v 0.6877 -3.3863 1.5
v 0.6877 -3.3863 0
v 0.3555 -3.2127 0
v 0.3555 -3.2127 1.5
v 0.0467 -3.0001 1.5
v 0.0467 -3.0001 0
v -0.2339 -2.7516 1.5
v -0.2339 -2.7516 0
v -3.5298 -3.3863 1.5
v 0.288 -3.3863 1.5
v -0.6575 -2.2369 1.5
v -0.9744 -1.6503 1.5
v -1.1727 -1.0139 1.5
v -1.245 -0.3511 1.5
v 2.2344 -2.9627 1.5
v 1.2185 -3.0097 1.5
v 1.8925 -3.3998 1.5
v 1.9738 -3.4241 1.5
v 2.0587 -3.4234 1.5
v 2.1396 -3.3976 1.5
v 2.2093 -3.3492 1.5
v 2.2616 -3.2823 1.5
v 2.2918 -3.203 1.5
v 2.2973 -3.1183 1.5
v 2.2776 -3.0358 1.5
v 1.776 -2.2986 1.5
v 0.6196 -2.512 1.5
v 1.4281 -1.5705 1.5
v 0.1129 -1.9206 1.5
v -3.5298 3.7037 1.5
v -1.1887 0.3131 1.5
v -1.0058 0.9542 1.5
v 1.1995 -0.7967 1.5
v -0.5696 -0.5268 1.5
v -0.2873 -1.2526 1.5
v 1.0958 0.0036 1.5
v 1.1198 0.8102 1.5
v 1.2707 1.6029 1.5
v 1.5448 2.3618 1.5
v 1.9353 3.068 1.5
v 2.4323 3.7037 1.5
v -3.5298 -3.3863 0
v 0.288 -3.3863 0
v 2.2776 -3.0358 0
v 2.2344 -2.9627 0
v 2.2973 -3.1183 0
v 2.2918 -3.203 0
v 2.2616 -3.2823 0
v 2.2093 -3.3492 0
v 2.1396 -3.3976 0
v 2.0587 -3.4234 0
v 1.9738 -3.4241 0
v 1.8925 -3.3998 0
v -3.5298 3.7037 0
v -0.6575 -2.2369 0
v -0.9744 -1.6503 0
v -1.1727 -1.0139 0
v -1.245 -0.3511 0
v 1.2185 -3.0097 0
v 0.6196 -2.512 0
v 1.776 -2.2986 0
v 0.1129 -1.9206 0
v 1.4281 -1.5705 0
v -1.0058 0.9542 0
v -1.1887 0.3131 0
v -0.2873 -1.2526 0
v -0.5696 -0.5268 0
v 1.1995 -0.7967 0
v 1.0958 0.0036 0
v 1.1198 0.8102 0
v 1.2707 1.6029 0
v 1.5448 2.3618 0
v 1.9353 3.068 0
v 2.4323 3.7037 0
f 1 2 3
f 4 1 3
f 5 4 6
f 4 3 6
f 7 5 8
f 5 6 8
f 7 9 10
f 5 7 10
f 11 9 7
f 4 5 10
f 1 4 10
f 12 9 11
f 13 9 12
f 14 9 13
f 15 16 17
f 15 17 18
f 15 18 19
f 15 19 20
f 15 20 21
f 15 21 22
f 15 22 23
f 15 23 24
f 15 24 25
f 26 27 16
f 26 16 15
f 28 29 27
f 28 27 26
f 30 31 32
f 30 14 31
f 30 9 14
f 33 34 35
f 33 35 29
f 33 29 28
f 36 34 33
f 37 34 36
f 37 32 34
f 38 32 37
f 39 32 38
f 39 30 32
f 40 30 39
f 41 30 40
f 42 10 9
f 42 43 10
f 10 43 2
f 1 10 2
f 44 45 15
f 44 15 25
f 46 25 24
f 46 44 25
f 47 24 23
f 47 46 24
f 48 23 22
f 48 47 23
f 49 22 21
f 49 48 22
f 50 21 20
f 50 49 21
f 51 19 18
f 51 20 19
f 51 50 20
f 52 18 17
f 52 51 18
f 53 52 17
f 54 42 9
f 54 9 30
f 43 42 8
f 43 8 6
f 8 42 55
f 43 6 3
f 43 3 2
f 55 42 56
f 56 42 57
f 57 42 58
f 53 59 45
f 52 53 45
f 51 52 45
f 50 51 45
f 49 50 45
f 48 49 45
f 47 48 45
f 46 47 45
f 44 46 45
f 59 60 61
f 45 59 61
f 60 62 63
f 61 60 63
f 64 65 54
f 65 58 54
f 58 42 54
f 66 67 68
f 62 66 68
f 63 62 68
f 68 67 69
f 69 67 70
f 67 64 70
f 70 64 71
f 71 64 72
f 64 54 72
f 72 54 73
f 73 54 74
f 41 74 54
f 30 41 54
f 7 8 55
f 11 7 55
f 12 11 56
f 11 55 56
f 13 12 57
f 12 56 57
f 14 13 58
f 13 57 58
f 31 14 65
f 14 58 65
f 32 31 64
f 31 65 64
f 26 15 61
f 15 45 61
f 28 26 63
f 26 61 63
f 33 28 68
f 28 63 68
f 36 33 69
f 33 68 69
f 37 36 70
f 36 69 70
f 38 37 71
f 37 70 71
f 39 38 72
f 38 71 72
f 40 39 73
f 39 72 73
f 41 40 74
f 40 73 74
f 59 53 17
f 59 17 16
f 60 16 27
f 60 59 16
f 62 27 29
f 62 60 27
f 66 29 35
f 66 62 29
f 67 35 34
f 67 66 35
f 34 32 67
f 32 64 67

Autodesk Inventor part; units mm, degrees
ref_plane "YZ Plane" through (0, 0, 0) normal (1, 0, 0) x (0, 1, 0)
ref_plane "XZ Plane" through (0, 0, 0) normal (0, 1, 0) x (-1, 0, 0)
ref_plane "XY Plane" through (0, 0, 0) normal (0, 0, 1) x (1, 0, 0)
sketch "Sketch1" plane through (0, 0, 0) normal (1, 0, 0) x (0, 1, 0)
  point P0 (0, 0)
sketch "Sketch2" plane through (0, 0, 0) normal (0, 0, 1) x (1, 0, 0)
  line L0 (4.0785, 4.9113) -> (2.4908, 4.9113) construction
  line L1 (4.0785, 3.7037) -> (4.0785, 4.9113) construction
  line L2 (2.4323, 3.7037) -> (4.0785, 3.7037) construction
  arc A0 (2.4323, 3.7037) -> (2.2344, -2.9627) centre (6.1869, 0.2561) ccw
  arc A1 (1.8925, -3.3998) -> (2.2344, -2.9627) centre (2.0138, -3.1424) ccw
  arc A2 (-0.5696, -0.5268) -> (1.8925, -3.3998) centre (3.8604, 0.7782) ccw
  line L3 (-1.0058, 0.9542) -> (-0.5696, -0.5268)
  arc A3 (-1.0058, 0.9542) -> (-0.2339, -2.7516) centre (2.2087, -0.3095) ccw
  arc A4 (-0.2339, -2.7516) -> (1.9052, -3.655) centre (1.9474, -0.5708) ccw
  line L4 (2.5244, -3.655) -> (1.9052, -3.655) construction
  line L5 (2.5244, -4.0286) -> (2.5244, -3.655) construction
  line L6 (1.9895, -4.0228) -> (2.5244, -4.0286) construction
  line L7 (1.9895, -3.8389) -> (1.9895, -4.0228) construction
  line L8 (1.9474, -3.8389) -> (1.9895, -3.8389) construction
  arc A5 (0.288, -3.3863) -> (1.9474, -3.8389) centre (1.9474, -0.5708) ccw construction
  line L9 (-3.5298, -3.3863) -> (0.288, -3.3863) construction
  line L10 (-3.5298, 3.7037) -> (-3.5298, -3.3863) construction
  line L11 (1.3533, 3.7037) -> (-3.5298, 3.7037) construction
  line L12 (2.4908, 4.9113) -> (1.3533, 3.7037) construction
  line L13 (0.288, -3.3863) -> (0.6877, -3.3863)
  line L14 (2.4323, 3.7037) -> (-3.5298, 3.7037)
  line L15 (-3.5298, -3.3863) -> (-3.5298, 3.7037)
  line L16 (0.288, -3.3863) -> (-3.5298, -3.3863)
  point P0 (0, 0)
extrude "Plate1" add sketch "Sketch2" along normal blind 1.5
equation "\"d0\" = Thickness"
equation "\"BendRadius\" = Thickness"
equation "\"BendReliefWidth\" = Thickness"
equation "\"BendReliefDepth\" = 0.5 * Thickness"
equation "\"CornerReliefSize\" = 4 * Thickness"
equation "\"MinimumRemnant\" = 2 * Thickness"
equation "\"TransitionRadius\" = BendRadius"
equation "\"JacobiRadiusSize\" = BendRadius"
equation "\"GapSize\" = Thickness"
equation "\"Thickness\" = 1.5"
properties part number "TRIGGER_2"
